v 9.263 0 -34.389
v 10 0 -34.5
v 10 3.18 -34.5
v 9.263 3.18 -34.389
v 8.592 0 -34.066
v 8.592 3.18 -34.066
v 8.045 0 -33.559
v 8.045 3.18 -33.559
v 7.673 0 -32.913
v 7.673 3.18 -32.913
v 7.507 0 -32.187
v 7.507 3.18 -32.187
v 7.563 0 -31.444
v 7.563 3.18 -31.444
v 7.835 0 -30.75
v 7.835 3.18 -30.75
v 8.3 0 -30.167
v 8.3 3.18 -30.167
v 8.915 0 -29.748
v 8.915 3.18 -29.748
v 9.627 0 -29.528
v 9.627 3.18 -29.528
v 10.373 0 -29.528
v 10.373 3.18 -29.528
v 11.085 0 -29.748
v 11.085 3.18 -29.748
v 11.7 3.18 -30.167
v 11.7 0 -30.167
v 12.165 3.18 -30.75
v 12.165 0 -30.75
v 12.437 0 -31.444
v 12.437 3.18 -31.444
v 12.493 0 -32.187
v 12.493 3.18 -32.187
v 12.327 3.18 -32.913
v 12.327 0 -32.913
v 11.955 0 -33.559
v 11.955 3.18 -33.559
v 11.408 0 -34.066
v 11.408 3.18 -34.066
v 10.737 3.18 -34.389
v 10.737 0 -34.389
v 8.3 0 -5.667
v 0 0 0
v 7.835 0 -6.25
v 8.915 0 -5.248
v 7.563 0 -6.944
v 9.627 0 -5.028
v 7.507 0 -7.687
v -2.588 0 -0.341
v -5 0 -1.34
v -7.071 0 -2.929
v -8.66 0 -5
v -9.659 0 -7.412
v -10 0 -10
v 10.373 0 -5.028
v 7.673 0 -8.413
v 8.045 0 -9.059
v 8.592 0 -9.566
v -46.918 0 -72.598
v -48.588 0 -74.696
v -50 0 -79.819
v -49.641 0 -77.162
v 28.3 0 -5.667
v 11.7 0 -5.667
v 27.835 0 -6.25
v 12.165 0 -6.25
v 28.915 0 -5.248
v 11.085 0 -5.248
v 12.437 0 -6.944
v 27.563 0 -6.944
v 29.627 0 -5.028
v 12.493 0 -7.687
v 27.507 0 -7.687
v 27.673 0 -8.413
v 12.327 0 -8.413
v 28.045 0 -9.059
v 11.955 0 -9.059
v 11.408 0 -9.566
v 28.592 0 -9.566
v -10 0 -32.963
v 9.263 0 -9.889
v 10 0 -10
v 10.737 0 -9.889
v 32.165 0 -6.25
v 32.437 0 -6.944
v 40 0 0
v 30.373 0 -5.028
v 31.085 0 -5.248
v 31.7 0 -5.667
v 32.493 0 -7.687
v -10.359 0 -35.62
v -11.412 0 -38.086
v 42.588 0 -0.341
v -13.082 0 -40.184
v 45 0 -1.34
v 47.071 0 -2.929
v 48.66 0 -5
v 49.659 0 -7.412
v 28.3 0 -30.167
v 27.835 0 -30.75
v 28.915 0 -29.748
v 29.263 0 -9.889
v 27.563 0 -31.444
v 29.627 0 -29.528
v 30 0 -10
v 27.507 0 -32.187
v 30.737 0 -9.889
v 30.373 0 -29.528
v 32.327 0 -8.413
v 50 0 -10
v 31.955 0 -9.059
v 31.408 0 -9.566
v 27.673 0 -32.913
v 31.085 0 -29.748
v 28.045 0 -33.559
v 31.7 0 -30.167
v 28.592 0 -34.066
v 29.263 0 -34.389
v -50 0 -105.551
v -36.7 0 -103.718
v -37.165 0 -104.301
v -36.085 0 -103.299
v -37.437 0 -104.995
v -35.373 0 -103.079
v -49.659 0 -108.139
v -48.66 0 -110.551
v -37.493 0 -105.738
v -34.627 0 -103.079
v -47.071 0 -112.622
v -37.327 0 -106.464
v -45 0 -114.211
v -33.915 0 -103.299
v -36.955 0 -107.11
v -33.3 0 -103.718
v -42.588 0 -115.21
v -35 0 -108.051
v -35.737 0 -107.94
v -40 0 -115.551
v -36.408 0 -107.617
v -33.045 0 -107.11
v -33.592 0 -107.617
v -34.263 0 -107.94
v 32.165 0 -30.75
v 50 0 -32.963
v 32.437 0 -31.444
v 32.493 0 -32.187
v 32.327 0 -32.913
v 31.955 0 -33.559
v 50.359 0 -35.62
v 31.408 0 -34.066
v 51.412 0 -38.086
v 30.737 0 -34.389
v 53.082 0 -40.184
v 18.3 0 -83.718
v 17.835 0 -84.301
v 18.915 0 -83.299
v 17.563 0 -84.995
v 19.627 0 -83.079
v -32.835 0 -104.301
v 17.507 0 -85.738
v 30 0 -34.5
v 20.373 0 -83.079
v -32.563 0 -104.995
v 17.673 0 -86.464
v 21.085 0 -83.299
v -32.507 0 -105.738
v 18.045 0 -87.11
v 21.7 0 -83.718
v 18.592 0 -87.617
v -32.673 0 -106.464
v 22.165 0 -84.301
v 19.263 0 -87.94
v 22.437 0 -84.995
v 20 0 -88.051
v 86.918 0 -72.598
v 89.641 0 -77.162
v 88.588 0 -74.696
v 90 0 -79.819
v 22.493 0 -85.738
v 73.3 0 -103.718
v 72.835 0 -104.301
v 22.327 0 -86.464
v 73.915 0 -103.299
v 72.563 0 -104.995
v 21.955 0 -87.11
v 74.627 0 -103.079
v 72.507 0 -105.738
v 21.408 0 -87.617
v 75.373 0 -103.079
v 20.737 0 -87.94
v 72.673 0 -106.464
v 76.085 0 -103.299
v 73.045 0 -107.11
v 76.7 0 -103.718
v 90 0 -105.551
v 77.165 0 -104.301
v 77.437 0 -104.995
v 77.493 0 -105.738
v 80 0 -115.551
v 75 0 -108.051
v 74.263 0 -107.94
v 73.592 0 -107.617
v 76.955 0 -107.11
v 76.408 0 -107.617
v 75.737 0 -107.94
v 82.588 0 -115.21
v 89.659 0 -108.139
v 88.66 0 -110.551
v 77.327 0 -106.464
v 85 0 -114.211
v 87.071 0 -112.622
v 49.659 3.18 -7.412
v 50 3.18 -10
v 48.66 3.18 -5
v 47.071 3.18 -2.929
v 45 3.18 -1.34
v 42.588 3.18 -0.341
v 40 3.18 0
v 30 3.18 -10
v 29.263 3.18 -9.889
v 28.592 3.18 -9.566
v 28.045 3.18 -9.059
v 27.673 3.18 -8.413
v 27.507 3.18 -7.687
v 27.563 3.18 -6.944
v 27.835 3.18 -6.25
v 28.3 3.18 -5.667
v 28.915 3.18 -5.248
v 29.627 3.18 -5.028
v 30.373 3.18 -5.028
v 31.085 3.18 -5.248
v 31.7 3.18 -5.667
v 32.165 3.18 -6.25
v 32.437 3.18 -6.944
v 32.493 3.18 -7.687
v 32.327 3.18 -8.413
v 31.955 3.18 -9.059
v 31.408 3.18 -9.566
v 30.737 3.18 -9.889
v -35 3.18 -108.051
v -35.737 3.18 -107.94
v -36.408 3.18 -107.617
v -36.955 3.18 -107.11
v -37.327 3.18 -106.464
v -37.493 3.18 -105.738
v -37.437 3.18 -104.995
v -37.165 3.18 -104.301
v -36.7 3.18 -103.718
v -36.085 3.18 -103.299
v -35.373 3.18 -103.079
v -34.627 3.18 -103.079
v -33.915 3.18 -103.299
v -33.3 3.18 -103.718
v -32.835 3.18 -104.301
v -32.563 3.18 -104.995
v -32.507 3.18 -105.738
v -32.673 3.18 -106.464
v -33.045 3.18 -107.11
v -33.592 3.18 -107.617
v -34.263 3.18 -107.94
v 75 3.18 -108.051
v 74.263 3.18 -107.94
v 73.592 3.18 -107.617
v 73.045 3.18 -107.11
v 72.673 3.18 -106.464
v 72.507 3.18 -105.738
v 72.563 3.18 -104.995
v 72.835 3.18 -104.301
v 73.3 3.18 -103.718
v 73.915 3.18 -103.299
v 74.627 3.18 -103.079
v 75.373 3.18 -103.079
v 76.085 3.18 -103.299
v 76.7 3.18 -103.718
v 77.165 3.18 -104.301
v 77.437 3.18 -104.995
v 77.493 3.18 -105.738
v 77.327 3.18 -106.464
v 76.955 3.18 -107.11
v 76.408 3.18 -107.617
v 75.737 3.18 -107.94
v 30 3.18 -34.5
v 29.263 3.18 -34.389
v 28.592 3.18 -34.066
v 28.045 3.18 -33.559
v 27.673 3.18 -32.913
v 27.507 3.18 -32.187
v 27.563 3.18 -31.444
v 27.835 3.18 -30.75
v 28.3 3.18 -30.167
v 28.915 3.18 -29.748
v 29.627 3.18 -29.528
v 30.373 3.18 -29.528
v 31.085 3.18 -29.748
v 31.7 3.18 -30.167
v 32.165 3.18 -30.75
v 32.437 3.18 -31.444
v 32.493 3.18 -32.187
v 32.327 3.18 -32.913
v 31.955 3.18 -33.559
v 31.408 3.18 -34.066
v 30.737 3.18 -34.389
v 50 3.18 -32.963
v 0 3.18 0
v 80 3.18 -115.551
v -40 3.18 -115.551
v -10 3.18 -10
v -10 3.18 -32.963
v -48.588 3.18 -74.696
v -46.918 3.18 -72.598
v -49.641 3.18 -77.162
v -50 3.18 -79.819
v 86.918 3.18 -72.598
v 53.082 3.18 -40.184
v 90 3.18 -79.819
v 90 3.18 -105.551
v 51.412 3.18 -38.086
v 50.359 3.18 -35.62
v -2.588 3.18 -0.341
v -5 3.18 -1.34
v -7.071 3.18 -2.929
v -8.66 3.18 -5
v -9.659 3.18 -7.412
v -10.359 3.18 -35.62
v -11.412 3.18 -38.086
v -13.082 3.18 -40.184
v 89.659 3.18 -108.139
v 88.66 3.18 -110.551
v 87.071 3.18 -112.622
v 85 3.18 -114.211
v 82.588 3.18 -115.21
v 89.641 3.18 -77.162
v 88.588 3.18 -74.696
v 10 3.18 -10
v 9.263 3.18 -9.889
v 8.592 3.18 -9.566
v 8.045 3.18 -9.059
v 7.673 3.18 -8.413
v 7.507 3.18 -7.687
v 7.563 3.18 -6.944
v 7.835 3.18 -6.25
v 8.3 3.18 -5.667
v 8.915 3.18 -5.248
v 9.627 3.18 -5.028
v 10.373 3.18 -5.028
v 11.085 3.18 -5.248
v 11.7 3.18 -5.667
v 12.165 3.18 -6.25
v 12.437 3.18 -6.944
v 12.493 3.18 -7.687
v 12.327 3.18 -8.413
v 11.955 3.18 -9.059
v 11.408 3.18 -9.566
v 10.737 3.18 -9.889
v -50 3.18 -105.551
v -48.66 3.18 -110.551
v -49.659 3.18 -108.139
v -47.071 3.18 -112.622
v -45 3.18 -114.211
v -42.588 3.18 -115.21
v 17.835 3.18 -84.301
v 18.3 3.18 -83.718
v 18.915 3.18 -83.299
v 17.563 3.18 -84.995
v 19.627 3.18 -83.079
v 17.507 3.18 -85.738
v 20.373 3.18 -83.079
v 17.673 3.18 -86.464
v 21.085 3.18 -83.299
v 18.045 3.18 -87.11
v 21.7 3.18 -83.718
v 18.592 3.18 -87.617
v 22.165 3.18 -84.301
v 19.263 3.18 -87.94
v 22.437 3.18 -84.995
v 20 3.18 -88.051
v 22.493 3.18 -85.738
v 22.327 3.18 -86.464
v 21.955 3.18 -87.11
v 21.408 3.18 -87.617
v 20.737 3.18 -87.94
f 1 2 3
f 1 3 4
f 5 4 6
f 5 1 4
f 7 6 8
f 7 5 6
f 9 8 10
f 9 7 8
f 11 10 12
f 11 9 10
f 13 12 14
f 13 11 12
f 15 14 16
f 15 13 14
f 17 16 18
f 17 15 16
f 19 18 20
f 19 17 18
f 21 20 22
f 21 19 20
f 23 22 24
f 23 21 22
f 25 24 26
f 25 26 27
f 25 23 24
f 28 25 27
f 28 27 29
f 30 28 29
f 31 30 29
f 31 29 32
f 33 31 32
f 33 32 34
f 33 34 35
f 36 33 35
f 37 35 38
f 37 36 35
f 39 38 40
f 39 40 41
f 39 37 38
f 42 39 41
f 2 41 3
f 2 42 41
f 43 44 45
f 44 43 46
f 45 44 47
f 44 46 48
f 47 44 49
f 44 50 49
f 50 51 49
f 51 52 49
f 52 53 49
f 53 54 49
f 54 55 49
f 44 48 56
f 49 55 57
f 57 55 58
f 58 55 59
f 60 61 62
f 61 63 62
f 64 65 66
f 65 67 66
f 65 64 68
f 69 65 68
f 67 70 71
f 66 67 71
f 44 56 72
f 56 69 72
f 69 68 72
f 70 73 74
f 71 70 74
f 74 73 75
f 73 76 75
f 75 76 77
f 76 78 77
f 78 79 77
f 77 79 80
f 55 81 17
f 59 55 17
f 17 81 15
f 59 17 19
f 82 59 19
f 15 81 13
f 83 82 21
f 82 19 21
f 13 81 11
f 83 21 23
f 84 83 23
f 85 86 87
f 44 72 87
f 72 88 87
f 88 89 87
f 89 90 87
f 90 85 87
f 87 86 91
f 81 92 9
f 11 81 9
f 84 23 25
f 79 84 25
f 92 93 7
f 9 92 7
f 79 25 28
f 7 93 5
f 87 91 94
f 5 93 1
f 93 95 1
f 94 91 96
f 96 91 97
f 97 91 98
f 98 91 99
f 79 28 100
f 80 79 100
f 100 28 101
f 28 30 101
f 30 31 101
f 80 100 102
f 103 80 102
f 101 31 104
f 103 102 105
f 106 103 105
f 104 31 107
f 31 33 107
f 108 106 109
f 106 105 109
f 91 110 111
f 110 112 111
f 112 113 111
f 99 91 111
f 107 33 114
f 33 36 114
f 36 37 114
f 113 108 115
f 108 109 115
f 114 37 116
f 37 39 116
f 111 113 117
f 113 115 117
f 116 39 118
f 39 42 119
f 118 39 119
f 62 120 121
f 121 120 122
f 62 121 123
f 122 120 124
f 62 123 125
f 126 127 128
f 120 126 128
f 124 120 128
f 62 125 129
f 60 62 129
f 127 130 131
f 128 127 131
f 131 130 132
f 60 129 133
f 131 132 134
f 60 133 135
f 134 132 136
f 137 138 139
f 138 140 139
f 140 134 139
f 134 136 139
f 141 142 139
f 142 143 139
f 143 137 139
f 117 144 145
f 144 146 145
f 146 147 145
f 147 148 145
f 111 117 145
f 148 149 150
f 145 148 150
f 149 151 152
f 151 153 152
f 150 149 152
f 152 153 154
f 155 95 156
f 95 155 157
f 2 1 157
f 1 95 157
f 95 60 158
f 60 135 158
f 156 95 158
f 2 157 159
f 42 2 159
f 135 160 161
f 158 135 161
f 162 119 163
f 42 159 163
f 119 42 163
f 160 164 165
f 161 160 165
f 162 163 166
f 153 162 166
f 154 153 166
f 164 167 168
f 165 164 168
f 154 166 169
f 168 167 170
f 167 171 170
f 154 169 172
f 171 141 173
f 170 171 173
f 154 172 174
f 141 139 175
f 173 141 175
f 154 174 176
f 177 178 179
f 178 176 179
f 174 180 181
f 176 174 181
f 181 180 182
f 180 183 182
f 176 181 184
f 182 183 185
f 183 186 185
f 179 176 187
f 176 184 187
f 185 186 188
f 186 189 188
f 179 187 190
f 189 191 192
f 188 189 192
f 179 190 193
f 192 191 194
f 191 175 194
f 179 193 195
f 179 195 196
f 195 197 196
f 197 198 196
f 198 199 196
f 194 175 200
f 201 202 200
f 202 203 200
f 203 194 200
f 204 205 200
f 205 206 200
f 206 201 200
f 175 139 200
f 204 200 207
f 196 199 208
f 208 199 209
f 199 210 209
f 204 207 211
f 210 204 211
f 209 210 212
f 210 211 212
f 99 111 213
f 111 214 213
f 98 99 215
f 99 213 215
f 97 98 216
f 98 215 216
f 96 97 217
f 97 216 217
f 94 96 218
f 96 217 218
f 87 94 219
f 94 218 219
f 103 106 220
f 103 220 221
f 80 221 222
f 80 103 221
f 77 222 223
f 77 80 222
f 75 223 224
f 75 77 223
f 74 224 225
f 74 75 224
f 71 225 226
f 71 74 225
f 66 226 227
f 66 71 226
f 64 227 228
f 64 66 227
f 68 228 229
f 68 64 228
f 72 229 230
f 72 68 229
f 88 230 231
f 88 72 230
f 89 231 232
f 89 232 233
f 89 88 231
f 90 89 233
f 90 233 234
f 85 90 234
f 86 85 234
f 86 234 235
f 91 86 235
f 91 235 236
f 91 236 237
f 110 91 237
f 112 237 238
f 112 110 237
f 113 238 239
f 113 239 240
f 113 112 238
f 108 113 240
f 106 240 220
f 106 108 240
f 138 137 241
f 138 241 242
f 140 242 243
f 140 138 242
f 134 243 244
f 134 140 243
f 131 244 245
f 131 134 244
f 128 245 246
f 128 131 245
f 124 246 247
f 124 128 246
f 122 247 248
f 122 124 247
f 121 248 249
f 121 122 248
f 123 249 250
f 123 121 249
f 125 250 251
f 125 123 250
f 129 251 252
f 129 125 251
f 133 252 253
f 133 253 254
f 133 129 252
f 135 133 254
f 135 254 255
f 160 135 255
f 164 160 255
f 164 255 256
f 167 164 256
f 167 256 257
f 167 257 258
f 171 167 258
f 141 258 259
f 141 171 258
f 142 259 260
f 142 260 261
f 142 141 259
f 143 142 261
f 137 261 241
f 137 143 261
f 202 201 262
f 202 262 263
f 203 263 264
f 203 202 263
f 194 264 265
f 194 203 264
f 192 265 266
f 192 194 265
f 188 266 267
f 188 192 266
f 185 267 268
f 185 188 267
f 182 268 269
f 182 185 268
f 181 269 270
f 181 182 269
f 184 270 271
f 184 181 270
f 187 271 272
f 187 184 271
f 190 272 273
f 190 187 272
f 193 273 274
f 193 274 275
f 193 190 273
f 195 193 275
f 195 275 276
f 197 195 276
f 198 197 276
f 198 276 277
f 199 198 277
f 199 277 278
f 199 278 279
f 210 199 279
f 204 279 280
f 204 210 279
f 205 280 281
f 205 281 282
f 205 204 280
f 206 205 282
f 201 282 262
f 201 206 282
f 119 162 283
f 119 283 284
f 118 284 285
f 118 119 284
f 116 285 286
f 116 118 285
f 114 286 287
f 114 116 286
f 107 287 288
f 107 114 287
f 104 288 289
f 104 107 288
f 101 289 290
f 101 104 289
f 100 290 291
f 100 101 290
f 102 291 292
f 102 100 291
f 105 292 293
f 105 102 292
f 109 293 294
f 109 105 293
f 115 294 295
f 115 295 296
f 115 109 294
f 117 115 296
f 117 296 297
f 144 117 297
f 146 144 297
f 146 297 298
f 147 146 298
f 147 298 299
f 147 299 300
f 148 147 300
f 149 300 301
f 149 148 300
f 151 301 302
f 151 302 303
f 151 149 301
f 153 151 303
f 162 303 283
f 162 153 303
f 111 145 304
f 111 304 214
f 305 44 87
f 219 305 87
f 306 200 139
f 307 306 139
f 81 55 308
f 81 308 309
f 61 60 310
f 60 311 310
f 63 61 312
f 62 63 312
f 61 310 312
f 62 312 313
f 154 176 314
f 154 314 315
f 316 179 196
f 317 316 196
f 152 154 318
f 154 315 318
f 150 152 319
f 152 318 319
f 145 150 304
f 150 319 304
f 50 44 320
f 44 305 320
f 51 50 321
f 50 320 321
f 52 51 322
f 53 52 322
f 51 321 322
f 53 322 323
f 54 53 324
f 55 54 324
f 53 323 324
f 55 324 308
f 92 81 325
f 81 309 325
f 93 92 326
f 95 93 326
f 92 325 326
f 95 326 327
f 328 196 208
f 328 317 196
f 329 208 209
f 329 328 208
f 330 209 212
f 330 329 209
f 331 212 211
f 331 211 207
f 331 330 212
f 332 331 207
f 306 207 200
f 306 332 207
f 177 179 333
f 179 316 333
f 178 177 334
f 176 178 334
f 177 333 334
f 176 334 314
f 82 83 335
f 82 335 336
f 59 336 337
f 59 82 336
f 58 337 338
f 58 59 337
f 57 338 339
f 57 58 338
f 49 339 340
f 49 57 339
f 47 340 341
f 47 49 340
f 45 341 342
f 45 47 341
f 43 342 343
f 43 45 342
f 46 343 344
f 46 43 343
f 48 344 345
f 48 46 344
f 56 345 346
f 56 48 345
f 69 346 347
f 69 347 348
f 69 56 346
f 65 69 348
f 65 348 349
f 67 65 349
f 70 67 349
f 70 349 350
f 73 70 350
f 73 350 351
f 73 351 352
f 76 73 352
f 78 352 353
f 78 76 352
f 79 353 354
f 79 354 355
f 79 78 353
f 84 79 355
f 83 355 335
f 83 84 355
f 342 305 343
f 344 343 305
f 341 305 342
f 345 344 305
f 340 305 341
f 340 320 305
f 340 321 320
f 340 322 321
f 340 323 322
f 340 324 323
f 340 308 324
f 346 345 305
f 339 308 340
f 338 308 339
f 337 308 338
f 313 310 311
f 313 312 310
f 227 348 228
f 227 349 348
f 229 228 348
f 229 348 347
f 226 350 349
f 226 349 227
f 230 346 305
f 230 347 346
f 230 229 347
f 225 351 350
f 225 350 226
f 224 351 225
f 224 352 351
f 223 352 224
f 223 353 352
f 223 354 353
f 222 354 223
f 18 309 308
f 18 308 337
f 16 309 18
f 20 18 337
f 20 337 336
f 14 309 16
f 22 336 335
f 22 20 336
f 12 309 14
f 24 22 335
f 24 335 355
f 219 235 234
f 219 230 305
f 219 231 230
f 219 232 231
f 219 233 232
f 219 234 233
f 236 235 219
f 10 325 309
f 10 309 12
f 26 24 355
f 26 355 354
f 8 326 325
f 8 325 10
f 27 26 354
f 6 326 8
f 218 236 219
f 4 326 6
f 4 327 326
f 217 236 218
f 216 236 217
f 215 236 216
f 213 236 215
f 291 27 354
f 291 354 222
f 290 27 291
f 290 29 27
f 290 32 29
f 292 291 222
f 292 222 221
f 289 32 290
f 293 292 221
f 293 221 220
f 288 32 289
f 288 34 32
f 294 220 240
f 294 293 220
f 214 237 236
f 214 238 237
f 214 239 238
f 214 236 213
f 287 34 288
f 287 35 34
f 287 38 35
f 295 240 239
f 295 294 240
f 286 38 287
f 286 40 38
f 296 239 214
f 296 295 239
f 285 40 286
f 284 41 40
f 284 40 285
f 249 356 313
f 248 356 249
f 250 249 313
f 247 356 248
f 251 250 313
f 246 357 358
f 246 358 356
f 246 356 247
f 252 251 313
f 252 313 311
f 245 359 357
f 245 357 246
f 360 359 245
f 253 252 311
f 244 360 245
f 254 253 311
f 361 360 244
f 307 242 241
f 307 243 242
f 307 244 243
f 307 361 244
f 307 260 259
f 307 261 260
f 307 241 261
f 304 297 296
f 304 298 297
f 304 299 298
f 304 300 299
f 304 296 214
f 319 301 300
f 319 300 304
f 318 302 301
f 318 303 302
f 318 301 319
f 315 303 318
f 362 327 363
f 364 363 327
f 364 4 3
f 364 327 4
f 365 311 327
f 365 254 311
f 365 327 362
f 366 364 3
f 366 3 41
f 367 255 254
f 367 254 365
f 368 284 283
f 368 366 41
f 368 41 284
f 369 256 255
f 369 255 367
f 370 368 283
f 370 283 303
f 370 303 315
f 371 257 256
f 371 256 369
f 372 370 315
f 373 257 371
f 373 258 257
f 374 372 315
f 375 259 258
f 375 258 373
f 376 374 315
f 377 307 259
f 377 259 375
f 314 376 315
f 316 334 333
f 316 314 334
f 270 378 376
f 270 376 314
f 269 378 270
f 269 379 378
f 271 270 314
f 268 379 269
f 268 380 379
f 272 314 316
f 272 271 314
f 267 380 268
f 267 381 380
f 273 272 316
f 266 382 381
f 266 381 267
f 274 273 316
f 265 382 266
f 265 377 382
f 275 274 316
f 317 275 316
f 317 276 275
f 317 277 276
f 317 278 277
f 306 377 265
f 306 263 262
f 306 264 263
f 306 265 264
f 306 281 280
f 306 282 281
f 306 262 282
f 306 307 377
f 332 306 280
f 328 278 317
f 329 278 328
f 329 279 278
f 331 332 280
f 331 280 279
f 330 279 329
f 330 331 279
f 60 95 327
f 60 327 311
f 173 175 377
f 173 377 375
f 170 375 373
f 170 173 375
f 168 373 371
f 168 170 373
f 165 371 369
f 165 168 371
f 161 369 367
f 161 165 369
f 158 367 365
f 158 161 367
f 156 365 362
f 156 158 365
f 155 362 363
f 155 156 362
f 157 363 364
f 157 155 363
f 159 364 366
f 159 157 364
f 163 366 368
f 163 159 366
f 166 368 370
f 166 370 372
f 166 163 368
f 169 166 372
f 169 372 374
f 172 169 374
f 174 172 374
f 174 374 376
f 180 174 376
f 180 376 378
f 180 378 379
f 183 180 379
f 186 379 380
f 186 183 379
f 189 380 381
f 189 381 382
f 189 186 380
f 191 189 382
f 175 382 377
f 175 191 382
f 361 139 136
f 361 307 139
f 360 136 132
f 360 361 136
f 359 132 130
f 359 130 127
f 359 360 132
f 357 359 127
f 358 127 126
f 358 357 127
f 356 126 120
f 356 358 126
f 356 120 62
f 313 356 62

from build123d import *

# Parameters (mm, degrees)
SKETCH1_R           = 2.5
BOSS_EXTRUDE1_DEPTH = 3.18
CUT_EXTRUDE1_DEPTH  = 147.499595989
FILLET1_R           = 10


with BuildPart() as part:
    # Sketch1 → Boss-Extrude1 (new body)
    with BuildSketch(Plane(origin=(0, 0, 0), x_dir=(1, 0, 0), z_dir=(0, 1, 0))):
        Polygon((0, 0), (40, 0), (90, 0), (90, 40), (90, 75.550937794), (90, 115.550937794), (-50, 115.550937794), (-50, 0), align=None)
        with Locations(Location((-35, 105.550937794, 0), (0, 0, 90))):
            Circle(SKETCH1_R, mode=Mode.SUBTRACT)
        with Locations(Location((75, 105.550937794, 0), (0, 0, 90))):
            Circle(SKETCH1_R, mode=Mode.SUBTRACT)
        with Locations(Location((20, 85.550937794, 0), (0, 0, 90))):
            Circle(SKETCH1_R, mode=Mode.SUBTRACT)
        with Locations(Location((10, 7.5, 0), (0, 0, 90))):
            Circle(SKETCH1_R, mode=Mode.SUBTRACT)
        with Locations(Location((30, 7.5, 0), (0, 0, 90))):
            Circle(SKETCH1_R, mode=Mode.SUBTRACT)
        with Locations(Location((10, 32, 0), (0, 0, 90))):
            Circle(SKETCH1_R, mode=Mode.SUBTRACT)
        with Locations(Location((30, 32, 0), (0, 0, 90))):
            Circle(SKETCH1_R, mode=Mode.SUBTRACT)
    extrude(amount=BOSS_EXTRUDE1_DEPTH)

    # Sketch3 → Cut-Extrude1 (cut, through all)
    with BuildSketch(Plane.XZ):
        Polygon((90, -75.550937794), (50, -37.231146138), (50, 0), (90, 0), (90, -37.231146138), align=None)
        Polygon((-10, -37.231146138), (-50, -75.550937794), (-50, -37.231146138), (-50, 0), (-10, 0), align=None)
    extrude(amount=-CUT_EXTRUDE1_DEPTH, mode=Mode.SUBTRACT)

    # Fillet1
    fillet1_edges = [part.edges().sort_by_distance(p)[0] for p in [
        (-50, 1.59, -115.550937794),
        (90, 1.59, -115.550937794),
        (90, 1.59, -75.550937794),
        (50, 1.59, -37.231146138),
        (50, 1.59, 0),
        (-10, 1.59, 0),
        (-10, 1.59, -37.231146138),
        (-50, 1.59, -75.550937794),
    ]]
    fillet(fillet1_edges, radius=FILLET1_R)


solid = part.part
